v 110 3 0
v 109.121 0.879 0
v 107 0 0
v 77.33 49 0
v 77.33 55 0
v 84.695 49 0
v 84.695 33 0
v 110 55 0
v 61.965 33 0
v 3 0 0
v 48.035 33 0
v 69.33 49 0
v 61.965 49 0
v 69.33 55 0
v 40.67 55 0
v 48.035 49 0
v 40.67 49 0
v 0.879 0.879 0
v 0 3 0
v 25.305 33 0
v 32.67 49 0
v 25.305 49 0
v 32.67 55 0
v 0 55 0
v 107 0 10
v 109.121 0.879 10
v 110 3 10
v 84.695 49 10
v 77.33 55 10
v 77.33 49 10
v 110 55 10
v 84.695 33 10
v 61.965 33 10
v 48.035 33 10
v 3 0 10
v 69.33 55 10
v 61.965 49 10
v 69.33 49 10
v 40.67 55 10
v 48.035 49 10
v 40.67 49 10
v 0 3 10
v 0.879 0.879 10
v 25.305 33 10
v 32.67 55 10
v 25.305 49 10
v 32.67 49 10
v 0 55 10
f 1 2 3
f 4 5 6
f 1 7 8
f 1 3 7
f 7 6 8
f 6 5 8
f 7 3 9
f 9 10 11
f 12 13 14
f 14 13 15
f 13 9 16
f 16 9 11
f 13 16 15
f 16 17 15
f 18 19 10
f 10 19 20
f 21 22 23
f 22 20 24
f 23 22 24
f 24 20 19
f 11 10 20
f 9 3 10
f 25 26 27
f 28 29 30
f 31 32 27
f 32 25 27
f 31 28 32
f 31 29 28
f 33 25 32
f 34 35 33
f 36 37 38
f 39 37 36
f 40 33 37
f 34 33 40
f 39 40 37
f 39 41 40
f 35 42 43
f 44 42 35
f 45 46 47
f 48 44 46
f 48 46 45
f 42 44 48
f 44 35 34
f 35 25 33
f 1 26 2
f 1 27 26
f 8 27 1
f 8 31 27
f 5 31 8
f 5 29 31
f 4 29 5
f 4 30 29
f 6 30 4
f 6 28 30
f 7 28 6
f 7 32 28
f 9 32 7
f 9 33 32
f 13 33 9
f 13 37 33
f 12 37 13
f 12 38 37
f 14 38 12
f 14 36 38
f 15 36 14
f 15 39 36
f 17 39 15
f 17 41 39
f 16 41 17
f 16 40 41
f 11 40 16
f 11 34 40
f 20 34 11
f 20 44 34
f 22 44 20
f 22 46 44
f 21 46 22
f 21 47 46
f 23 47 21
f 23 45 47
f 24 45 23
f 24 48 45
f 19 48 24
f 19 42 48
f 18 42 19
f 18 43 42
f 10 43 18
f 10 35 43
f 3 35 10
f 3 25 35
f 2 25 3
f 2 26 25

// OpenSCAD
$fn = 32;

// ----------------------------------------------------------------------
// Window plate: 110 x 55 mm, 2 open windows
// ----------------------------------------------------------------------

// --- parameters (mm) ---
profile_height = 10;      // extrusion height
profile_points = 24;      // points of the closed outline

profile = [[0, 3], [0.879, 0.879], [3, 0], [107, 0], [109.121, 0.879], [110, 3], [110, 55], [77.33, 55], [77.33, 49], [84.695, 49], [84.695, 33], [61.965, 33], [61.965, 49], [69.33, 49], [69.33, 55], [40.67, 55], [40.67, 49], [48.035, 49], [48.035, 33], [25.305, 33], [25.305, 49], [32.67, 49], [32.67, 55], [0, 55]];  // single closed polygon, 24 points, counter clockwise

// --- the one profile operation ---
linear_extrude(height = profile_height) polygon(points = profile);
